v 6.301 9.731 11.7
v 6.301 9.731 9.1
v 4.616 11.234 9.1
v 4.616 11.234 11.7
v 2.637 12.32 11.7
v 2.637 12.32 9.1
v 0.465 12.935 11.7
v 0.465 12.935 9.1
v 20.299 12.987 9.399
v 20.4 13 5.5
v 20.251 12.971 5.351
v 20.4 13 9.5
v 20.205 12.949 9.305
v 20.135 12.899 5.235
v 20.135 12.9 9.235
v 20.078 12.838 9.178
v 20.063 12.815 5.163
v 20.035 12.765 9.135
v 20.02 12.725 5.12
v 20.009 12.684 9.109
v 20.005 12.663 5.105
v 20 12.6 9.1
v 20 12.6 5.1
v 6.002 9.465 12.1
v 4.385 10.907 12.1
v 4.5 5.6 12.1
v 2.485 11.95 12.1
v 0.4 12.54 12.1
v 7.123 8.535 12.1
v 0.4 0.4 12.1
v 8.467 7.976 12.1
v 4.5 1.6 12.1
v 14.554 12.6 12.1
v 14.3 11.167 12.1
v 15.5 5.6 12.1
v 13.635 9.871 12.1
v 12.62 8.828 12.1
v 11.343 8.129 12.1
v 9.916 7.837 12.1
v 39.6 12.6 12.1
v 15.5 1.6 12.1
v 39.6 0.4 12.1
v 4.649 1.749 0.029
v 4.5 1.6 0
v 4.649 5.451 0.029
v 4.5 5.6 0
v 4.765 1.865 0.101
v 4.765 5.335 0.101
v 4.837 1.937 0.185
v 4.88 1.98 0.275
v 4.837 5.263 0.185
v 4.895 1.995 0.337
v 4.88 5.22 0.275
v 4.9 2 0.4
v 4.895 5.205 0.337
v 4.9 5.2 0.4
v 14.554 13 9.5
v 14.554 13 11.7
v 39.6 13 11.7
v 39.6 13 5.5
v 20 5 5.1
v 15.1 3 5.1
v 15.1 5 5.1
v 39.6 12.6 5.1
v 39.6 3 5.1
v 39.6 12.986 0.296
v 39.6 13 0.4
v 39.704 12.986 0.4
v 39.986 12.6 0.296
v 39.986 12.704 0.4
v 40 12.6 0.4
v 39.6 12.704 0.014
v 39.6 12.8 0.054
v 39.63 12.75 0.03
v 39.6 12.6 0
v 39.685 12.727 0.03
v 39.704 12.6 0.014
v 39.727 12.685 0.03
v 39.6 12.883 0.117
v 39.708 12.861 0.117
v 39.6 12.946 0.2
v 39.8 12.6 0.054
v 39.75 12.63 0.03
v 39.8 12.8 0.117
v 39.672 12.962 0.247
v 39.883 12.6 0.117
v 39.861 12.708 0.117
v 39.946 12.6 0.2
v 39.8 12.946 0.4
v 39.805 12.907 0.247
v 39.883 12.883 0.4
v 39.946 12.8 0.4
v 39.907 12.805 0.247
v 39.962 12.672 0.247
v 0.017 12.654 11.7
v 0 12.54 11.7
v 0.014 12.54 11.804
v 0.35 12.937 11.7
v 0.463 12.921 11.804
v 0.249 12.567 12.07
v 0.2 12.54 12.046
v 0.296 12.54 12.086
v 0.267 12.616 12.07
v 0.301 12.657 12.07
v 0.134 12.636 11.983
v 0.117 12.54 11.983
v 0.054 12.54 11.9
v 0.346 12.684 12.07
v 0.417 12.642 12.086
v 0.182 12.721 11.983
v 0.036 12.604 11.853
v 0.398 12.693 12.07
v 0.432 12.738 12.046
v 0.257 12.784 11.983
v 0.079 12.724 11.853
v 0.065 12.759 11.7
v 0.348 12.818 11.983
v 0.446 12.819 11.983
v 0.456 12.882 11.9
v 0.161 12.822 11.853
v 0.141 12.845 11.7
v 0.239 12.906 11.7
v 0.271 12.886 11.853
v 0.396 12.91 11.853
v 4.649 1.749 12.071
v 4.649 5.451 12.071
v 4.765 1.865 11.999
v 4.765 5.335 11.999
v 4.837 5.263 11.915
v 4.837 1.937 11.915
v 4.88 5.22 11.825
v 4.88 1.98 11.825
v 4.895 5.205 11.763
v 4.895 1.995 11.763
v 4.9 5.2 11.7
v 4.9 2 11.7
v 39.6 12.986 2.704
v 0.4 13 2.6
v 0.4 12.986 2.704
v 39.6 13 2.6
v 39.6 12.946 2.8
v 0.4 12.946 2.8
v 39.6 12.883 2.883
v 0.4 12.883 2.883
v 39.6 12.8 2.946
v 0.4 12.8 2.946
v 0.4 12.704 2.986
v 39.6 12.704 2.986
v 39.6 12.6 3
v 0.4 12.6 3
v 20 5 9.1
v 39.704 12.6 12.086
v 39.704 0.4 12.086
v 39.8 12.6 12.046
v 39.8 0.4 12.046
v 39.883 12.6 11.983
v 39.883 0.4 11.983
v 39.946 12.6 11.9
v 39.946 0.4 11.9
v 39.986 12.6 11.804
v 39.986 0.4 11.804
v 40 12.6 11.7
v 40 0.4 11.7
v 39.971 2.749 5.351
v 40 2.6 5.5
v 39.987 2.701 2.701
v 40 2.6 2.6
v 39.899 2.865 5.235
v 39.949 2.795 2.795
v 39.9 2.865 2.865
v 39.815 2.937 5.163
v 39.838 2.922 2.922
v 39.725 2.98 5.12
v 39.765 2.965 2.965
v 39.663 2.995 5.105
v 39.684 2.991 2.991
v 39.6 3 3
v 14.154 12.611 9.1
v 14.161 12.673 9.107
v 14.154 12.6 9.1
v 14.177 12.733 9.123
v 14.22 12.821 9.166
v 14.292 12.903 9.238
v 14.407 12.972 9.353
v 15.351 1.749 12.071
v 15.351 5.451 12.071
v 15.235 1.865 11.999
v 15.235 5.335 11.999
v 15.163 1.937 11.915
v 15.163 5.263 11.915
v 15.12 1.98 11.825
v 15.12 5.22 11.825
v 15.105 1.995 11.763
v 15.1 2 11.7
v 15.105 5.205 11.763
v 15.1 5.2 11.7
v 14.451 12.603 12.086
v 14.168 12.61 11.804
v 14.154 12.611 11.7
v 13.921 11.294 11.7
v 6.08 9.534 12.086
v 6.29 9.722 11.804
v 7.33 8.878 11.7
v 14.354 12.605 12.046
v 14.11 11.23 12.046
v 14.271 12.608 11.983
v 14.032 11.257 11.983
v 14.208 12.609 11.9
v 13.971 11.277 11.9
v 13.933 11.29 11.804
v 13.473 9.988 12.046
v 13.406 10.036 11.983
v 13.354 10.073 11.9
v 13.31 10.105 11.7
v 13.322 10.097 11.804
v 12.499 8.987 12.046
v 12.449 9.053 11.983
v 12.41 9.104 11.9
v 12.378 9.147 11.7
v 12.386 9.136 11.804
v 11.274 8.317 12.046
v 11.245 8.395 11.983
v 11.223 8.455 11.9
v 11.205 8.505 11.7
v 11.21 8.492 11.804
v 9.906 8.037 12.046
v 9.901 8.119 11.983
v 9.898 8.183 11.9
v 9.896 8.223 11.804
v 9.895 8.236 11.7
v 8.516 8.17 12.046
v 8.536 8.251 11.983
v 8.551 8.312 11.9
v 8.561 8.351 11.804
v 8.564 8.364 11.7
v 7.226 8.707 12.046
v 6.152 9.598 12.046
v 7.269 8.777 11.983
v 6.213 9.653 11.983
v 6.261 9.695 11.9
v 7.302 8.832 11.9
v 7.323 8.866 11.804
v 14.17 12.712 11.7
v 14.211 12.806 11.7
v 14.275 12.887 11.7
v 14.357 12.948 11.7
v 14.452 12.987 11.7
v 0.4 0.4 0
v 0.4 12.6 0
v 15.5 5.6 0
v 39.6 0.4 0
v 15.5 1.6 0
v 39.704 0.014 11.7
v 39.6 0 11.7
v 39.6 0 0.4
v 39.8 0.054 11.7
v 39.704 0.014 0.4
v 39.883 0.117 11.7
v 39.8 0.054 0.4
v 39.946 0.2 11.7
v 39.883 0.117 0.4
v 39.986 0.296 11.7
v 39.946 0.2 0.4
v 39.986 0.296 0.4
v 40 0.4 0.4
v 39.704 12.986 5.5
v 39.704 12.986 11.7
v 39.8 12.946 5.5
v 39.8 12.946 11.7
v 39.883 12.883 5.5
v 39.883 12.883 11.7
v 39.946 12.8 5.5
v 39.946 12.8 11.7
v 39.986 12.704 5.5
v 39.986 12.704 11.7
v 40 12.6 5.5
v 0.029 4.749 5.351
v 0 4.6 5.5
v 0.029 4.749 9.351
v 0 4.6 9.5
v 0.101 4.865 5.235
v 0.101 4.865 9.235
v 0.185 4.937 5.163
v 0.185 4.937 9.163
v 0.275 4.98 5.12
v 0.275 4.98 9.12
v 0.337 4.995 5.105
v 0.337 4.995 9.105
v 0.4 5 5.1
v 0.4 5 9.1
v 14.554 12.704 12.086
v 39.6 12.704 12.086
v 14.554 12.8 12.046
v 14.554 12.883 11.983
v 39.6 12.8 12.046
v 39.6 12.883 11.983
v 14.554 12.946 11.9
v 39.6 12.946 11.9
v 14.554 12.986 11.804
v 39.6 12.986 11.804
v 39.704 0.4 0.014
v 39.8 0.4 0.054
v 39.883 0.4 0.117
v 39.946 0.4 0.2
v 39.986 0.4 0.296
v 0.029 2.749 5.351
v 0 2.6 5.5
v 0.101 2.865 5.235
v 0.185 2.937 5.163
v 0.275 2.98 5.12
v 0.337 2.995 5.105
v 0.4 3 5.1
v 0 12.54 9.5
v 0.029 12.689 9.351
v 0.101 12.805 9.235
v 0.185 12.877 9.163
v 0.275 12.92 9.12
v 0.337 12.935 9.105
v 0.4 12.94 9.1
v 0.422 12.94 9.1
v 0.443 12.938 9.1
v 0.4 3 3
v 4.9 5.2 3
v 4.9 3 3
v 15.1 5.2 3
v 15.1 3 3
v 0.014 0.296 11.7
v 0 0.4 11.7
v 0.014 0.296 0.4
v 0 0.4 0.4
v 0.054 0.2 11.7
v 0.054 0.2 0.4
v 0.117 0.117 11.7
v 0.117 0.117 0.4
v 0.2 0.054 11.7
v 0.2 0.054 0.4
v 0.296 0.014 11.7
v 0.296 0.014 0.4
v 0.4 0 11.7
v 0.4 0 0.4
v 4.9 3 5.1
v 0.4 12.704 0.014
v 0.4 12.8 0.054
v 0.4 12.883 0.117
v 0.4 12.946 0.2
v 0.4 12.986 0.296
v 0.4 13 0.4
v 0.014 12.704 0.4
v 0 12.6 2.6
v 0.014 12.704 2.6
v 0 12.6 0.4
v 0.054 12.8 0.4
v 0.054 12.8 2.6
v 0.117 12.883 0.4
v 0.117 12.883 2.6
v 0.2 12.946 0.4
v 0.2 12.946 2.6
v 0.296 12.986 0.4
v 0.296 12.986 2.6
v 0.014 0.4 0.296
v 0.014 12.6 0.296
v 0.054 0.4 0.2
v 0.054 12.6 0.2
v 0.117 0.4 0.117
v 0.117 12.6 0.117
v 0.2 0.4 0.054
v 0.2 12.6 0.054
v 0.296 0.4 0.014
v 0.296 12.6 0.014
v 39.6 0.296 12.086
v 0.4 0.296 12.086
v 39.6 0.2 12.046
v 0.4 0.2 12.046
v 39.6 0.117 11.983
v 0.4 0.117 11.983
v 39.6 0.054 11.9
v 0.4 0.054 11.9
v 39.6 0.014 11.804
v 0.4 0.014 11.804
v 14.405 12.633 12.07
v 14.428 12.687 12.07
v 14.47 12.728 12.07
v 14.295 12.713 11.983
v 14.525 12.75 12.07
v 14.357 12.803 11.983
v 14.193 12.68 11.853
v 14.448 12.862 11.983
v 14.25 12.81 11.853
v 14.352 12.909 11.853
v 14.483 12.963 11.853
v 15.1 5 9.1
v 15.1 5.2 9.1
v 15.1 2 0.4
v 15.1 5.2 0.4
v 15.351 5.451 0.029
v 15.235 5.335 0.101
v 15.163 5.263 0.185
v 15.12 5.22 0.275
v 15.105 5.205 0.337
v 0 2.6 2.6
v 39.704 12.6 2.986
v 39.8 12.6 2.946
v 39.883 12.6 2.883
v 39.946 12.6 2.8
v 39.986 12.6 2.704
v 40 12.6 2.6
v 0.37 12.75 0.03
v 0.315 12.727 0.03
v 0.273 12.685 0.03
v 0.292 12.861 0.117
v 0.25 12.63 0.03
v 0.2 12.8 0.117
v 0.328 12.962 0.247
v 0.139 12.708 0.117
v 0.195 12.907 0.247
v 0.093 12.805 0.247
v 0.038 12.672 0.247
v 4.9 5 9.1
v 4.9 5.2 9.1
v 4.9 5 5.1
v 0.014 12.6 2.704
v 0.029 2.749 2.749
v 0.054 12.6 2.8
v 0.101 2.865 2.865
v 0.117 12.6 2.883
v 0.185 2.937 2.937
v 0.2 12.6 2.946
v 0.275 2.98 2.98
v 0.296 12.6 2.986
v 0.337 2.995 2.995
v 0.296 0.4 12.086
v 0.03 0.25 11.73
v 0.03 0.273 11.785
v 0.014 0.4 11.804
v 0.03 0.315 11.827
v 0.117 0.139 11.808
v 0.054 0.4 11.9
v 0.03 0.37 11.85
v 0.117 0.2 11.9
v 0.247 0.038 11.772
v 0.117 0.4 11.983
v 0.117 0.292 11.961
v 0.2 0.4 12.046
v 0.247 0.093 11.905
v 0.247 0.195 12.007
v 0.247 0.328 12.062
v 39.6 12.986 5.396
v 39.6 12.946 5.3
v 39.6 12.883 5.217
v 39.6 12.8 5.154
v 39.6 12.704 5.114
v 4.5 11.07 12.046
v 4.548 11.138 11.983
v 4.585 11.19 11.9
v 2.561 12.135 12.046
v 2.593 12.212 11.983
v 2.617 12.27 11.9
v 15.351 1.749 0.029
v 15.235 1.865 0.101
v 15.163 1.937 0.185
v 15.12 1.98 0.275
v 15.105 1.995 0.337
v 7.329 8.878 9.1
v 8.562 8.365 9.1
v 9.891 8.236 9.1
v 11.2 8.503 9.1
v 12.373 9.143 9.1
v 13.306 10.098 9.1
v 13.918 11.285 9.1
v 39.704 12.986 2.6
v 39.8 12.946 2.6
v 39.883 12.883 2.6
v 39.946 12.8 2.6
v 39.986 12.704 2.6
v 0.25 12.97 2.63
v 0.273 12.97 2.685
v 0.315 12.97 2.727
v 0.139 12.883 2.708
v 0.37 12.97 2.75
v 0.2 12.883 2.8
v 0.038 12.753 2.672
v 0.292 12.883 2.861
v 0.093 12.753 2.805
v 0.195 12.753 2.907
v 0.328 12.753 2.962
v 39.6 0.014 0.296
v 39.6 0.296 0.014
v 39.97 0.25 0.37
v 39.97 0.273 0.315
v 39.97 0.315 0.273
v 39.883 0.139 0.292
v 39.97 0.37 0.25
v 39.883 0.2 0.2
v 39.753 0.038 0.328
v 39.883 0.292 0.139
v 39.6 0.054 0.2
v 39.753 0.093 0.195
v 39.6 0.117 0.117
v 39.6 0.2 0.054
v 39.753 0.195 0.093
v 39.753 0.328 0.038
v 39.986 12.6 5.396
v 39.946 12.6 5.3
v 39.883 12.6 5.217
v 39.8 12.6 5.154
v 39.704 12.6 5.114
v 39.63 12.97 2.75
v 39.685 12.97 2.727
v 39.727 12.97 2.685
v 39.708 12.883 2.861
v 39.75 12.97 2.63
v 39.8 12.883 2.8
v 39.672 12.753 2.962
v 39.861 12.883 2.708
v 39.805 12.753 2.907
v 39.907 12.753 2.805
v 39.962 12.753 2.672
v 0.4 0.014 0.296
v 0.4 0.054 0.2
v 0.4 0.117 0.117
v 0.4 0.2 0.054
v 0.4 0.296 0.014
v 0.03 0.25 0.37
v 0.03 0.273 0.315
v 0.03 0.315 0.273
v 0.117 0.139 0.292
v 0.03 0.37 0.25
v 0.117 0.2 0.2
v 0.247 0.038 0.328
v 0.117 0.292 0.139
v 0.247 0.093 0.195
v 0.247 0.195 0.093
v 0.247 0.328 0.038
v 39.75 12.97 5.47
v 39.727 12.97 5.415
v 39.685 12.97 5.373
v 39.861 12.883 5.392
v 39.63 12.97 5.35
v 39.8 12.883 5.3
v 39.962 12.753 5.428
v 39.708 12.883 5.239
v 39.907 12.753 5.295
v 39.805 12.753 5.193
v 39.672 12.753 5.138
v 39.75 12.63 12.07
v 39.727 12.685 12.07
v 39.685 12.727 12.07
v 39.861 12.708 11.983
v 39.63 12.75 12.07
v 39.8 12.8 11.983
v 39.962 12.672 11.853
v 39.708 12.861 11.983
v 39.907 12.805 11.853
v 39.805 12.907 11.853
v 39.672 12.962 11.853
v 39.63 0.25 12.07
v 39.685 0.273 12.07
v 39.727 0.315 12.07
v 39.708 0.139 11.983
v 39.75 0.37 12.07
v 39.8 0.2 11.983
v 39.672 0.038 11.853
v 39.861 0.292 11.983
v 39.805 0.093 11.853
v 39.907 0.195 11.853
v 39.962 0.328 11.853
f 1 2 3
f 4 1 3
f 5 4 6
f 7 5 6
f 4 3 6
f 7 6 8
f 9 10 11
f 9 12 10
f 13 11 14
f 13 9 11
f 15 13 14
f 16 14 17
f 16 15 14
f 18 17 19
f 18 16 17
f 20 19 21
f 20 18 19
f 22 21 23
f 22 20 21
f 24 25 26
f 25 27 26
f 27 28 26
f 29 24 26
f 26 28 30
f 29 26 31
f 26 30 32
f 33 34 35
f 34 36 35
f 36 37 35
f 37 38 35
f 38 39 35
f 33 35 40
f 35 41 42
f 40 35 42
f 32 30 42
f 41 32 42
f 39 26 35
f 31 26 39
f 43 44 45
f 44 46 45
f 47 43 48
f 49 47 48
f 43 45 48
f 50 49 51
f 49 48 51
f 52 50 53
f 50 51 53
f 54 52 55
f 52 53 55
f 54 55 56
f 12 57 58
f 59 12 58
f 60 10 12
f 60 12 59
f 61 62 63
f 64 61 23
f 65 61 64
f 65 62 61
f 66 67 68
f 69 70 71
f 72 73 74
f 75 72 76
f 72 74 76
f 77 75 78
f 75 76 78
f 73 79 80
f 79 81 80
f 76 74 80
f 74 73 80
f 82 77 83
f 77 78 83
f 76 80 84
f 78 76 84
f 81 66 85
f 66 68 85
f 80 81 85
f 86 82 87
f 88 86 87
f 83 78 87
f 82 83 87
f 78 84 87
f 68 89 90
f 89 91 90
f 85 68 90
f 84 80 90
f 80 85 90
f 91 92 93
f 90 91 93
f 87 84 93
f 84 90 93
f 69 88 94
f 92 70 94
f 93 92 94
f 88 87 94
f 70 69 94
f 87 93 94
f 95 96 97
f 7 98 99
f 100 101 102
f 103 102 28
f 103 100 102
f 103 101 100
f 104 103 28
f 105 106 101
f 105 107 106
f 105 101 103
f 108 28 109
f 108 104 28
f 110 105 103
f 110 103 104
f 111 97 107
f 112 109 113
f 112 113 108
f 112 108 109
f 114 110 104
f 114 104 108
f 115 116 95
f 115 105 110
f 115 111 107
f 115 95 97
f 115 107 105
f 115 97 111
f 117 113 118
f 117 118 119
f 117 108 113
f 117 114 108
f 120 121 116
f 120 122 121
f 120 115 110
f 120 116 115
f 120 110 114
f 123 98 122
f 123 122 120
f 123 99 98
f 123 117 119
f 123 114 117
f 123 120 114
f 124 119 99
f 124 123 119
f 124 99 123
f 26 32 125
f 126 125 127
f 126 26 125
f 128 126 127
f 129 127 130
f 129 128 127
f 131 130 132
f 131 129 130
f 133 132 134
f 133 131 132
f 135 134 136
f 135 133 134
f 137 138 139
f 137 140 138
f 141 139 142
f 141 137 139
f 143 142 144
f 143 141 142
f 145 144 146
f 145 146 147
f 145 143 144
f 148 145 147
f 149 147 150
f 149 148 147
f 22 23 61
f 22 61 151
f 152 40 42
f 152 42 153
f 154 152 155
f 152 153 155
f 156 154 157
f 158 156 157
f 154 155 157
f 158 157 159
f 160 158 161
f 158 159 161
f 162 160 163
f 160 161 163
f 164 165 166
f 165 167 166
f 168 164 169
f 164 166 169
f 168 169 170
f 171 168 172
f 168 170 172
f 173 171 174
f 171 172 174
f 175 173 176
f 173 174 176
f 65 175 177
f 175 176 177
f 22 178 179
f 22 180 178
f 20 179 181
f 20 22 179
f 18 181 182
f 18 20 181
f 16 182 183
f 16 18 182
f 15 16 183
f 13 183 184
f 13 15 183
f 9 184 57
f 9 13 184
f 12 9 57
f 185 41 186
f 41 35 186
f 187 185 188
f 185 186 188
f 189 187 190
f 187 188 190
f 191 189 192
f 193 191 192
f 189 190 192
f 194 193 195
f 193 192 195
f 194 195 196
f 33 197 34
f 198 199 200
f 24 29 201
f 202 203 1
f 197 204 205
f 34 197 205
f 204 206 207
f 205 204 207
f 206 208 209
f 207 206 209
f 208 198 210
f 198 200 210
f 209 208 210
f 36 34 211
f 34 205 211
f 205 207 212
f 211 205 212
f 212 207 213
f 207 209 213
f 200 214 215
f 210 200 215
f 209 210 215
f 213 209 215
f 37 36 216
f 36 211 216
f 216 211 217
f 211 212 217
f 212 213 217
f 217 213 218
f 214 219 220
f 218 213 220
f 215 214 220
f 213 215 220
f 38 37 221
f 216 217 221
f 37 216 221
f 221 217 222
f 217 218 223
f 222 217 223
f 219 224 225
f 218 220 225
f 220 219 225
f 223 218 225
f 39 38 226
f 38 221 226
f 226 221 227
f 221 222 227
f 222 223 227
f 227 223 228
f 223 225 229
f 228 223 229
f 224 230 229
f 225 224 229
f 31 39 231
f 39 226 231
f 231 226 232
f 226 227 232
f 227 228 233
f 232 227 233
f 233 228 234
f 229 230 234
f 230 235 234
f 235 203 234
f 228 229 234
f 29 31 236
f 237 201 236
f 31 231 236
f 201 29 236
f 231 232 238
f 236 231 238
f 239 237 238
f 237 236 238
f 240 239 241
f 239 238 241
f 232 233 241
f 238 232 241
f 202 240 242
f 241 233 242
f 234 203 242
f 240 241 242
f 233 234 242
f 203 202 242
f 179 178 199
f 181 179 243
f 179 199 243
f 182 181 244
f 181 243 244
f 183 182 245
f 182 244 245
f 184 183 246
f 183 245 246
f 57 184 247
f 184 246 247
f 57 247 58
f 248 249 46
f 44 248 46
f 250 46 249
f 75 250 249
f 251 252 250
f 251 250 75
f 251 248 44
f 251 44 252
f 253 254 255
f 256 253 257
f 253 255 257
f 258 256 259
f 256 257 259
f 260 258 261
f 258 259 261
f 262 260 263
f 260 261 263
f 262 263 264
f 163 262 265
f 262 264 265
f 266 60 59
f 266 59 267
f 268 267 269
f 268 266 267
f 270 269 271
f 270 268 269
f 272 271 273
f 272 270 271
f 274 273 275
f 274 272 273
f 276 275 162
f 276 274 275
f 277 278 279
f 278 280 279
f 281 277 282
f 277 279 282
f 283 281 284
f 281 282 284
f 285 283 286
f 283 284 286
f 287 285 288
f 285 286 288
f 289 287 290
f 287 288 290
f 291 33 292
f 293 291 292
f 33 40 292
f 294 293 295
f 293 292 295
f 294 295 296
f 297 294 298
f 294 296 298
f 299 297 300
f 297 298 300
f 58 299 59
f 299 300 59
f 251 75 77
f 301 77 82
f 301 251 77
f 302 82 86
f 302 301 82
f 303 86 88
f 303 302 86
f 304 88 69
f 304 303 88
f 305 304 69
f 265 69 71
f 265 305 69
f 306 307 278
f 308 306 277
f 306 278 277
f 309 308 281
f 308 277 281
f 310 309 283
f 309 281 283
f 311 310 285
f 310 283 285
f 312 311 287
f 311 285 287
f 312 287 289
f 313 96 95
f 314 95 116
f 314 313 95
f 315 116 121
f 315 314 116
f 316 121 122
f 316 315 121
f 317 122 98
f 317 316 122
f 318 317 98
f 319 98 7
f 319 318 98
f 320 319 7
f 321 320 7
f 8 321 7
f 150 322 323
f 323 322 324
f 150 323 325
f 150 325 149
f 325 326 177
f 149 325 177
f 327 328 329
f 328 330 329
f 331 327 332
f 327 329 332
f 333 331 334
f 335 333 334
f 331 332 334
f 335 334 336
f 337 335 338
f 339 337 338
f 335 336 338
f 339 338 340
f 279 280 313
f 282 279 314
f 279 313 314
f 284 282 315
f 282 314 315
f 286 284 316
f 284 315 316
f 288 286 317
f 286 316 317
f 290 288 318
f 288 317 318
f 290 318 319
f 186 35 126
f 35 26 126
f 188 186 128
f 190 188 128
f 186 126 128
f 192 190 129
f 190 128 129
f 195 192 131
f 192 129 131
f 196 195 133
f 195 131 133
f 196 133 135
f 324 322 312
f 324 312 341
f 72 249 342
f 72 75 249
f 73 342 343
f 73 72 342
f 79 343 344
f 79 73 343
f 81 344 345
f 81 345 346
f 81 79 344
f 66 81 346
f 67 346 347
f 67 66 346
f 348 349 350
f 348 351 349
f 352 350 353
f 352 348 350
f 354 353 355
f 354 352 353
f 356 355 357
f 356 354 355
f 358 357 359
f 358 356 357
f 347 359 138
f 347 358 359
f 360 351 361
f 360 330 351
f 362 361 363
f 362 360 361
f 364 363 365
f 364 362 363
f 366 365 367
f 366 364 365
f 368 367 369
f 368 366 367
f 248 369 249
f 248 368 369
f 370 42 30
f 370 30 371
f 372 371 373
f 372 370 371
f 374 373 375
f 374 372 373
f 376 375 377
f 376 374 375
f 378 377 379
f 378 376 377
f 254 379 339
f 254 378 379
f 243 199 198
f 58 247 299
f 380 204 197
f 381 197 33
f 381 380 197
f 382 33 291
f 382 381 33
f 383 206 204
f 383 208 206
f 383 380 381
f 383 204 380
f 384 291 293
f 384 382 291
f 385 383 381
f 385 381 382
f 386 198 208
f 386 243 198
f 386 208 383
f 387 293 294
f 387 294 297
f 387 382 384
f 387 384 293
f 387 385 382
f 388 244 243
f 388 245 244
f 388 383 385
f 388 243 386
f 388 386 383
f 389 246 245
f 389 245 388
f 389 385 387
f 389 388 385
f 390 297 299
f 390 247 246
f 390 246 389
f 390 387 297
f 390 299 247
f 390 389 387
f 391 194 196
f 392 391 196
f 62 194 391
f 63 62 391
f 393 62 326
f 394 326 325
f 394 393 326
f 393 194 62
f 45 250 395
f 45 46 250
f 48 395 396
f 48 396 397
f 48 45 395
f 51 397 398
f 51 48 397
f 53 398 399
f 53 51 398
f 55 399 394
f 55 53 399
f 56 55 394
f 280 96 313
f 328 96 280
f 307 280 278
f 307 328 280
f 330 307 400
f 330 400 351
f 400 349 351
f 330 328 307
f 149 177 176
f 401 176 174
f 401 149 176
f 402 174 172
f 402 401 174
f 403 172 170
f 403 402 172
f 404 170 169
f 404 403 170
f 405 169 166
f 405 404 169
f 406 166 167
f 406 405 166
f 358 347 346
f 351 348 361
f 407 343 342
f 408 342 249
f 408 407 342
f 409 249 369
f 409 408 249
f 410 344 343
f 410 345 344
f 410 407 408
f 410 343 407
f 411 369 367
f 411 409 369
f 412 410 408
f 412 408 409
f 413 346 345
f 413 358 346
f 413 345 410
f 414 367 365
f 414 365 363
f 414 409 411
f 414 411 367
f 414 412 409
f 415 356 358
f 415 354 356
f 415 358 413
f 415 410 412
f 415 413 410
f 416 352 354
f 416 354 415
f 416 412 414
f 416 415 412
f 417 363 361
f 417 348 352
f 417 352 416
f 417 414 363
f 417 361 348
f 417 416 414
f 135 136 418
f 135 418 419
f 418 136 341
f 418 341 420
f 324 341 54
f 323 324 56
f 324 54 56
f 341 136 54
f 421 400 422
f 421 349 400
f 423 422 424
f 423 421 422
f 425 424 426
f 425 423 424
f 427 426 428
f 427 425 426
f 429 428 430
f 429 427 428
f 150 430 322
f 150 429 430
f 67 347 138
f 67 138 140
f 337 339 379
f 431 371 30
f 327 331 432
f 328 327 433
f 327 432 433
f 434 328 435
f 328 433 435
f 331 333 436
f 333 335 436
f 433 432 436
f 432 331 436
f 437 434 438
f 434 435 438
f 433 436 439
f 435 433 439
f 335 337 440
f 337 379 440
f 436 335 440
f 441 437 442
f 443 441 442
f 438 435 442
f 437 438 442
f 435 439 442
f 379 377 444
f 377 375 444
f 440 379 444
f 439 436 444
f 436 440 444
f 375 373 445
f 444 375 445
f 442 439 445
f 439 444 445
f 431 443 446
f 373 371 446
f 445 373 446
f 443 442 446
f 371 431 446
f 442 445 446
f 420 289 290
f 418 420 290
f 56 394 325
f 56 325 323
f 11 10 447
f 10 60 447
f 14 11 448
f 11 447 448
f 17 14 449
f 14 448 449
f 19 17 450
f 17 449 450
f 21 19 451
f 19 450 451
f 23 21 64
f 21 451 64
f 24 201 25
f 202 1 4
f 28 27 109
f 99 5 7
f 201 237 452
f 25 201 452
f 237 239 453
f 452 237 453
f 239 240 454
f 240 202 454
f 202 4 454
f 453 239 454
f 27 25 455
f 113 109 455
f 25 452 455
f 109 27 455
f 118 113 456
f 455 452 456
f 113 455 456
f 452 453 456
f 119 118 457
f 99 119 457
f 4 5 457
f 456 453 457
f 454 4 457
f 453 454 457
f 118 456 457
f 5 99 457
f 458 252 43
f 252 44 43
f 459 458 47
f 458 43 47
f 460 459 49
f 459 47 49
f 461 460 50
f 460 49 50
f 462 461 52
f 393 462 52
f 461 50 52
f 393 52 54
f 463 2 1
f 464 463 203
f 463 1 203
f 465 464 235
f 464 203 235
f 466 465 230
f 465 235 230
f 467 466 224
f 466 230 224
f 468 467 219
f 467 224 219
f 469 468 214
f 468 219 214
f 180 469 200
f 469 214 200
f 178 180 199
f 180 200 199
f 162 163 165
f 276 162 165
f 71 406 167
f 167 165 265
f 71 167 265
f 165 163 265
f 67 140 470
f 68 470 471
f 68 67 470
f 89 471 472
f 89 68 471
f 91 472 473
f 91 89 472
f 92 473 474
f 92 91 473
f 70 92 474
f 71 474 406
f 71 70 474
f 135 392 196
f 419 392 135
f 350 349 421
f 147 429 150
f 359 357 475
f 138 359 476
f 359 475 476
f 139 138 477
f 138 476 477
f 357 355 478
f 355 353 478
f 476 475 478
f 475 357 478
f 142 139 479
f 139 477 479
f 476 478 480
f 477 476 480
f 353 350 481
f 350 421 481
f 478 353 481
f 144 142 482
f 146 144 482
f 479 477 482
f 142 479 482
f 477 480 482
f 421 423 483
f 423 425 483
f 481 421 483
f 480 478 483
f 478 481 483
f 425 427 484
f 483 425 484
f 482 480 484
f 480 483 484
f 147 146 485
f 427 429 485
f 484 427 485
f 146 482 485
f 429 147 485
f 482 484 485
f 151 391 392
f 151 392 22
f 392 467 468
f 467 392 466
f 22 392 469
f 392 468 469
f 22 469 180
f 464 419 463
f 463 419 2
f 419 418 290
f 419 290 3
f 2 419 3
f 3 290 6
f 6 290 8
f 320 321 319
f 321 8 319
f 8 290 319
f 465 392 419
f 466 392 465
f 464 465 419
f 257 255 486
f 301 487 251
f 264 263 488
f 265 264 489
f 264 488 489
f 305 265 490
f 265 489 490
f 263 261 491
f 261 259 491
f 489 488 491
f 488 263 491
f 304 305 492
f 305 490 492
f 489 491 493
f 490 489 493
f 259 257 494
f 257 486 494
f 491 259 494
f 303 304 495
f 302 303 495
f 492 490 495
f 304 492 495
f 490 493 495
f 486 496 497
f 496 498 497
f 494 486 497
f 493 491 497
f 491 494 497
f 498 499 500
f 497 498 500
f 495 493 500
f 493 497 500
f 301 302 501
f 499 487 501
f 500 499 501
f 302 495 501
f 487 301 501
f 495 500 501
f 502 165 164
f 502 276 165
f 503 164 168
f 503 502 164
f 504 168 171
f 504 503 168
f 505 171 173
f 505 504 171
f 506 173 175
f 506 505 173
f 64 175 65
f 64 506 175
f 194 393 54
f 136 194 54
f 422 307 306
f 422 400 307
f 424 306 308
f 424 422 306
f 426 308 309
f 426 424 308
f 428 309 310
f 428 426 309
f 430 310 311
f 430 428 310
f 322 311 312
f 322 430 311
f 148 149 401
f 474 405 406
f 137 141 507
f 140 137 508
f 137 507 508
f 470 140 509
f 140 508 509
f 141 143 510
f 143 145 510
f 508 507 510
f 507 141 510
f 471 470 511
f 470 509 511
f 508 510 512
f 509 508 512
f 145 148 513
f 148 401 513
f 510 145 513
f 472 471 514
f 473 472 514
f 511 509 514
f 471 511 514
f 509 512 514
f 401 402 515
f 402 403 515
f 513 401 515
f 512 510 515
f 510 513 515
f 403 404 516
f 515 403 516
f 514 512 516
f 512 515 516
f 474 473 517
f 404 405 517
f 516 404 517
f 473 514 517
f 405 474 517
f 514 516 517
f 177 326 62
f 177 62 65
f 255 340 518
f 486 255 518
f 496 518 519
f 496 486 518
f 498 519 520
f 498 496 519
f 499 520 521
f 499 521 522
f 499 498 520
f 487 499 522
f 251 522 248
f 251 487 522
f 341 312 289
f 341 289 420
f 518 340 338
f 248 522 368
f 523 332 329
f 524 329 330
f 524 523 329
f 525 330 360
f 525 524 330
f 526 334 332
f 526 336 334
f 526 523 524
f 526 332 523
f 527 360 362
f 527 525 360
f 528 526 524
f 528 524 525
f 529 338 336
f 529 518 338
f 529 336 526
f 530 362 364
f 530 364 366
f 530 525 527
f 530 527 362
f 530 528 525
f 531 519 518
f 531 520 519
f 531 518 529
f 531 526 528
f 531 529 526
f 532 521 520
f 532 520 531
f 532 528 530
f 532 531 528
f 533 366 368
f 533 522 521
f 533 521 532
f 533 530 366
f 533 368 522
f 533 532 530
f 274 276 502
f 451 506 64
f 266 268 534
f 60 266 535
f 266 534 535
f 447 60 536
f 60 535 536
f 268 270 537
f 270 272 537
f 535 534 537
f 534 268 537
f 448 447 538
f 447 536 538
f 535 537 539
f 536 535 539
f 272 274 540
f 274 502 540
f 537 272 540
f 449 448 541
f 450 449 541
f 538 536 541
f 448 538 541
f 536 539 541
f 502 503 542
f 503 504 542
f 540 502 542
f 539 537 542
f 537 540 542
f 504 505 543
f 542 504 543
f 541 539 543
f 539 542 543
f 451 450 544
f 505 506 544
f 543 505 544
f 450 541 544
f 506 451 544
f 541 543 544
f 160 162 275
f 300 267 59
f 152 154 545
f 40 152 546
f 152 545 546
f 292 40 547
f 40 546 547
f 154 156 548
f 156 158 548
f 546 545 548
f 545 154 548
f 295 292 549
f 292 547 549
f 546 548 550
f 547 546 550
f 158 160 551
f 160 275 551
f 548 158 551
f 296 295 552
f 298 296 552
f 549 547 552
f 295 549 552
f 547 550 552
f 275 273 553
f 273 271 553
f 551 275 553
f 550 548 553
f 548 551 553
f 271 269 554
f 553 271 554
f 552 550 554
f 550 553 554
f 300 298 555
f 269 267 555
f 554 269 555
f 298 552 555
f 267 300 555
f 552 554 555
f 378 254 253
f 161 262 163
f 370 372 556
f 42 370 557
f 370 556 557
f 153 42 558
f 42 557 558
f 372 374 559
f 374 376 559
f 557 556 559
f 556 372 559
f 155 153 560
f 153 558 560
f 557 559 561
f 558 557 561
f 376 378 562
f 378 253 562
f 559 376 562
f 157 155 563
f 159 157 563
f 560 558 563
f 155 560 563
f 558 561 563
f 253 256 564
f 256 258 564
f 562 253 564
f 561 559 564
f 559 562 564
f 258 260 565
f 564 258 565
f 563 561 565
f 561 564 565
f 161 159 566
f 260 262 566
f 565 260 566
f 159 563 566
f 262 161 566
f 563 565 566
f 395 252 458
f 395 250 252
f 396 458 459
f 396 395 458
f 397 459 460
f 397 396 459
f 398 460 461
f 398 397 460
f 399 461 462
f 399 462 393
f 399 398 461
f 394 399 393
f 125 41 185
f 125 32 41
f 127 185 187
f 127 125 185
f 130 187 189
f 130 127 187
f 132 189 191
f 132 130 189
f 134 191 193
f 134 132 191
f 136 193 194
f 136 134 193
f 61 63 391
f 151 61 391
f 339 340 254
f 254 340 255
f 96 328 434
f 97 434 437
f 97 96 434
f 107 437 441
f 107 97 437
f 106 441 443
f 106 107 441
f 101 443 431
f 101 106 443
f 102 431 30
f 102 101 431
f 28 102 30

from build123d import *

# Parameters (mm, degrees)
SKETCH1_W           = 40
SKETCH1_H           = 12.1
BOSS_EXTRUDE1_DEPTH = 3
SKETCH2_W           = 40
SKETCH2_H           = 3
SKETCH2_H_2         = 7
BOSS_EXTRUDE2_DEPTH = 10
SKETCH3_W           = 10.2
SKETCH3_H           = 3.2
CUT_EXTRUDE1_DEPTH  = 44.765397291
SKETCH4_W           = 4
SKETCH4_H           = 8
CUT_EXTRUDE2_DEPTH  = 20
SKETCH5_R           = 4.5
CUT_EXTRUDE3_DEPTH  = 3
FILLET2_R           = 10
FILLET1_R           = 0.4


with BuildPart() as part:
    # Sketch1 → Boss-Extrude1 (new body)
    with BuildSketch(Plane(origin=(0, 0, 0), x_dir=(1, 0, 0), z_dir=(0, 1, 0))):
        with Locations((20, -6.05)):
            Rectangle(SKETCH1_W, SKETCH1_H)
    extrude(amount=BOSS_EXTRUDE1_DEPTH)

    # Sketch2 → Boss-Extrude2 (add)
    with BuildSketch(Plane(origin=(0, 3, 0), x_dir=(1, 0, 0), z_dir=(0, 1, 0))):
        with Locations((20, -1.5)):
            Rectangle(SKETCH2_W, SKETCH2_H)
        with Locations((20, -8.6)):
            Rectangle(SKETCH2_W, SKETCH2_H_2)
    extrude(amount=BOSS_EXTRUDE2_DEPTH)

    # Sketch3 → Cut-Extrude1 (cut, through all)
    with BuildSketch(Plane(origin=(0, 0, 0), x_dir=(-1, 0, 0), z_dir=(0, 0, -1))):
        with Locations((-10, 3.6)):
            Rectangle(SKETCH3_W, SKETCH3_H)
    extrude(amount=-CUT_EXTRUDE1_DEPTH, mode=Mode.SUBTRACT)

    # Sketch4 → Cut-Extrude2 (cut)
    with BuildSketch(Plane.ZY):
        with Locations((7.1, 9)):
            Rectangle(SKETCH4_W, SKETCH4_H)
    extrude(amount=-CUT_EXTRUDE2_DEPTH, mode=Mode.SUBTRACT)

    # Sketch5 → Cut-Extrude3 (cut)
    with BuildSketch(Plane.XY.offset(12.1)):
        with Locations((9.655746404, 12.73)):
            Circle(SKETCH5_R)
    extrude(amount=-CUT_EXTRUDE3_DEPTH, mode=Mode.SUBTRACT)

    # Fillet2
    # the kernel refuses this fillet: 10 mm, written as the material it takes off along each edge
    with BuildSketch(Plane(origin=(5.163853707, 13, 9.1), x_dir=(0.32846589208199206, -0.9445158324447405, 0), z_dir=(0, 0, 1))) as fillet2_piece_1:
        with BuildLine():
            CenterArc((7.306356337, -9.231062175), FILLET2_R, 112.615500581, 41.575528471)
            Line((-1.696149814, -4.877341583), (0, 0))
            ThreePointArc((0, 0), (1.730452817, -0.346022021), (3.460905633, 0))
        make_face()
    extrude(amount=15.909634267, mode=Mode.SUBTRACT)

    # Fillet1
    fillet1_edges = [part.edges().sort_by_distance(p)[0] for p in [
        (0, 3, 4.05),
        (0, 8, 3),
        (40, 8, 3),
        (0, 13, 1.5),
        (20, 13, 3),
        (40, 13, 1.5),
        (20, 13, 0),
        (40, 3, 4.05),
        (40, 8, 5.1),
        (40, 13, 8.6),
        (30, 13, 5.1),
        (15.1, 3.6, 12.1),
        (10, 5.2, 12.1),
        (4.9, 3.6, 12.1),
        (10, 2, 12.1),
        (15.1, 3.6, 0),
        (10, 2, 0),
        (4.9, 3.6, 0),
        (20, 0, 0),
        (10, 5.2, 0),
        (40, 0, 6.05),
        (20, 0, 12.1),
        (0, 0, 6.05),
        (0, 13, 10.6),
        (0, 4, 5.1),
        (17.07381955, 13, 9.1),
        (20, 13, 7.1),
        (0, 5, 7.1),
        (0, 9, 9.1),
        (0, 6.5, 0),
        (40, 6.5, 0),
        (40, 6.5, 12.1),
        (0, 6.5, 12.1),
        (27.07381955, 13, 12.1),
        (14.147639101, 13, 10.6),
        (11.38619922, 8.576022021, 12.1),
        (3.450117075, 11.943404417, 12.1),
    ]]
    fillet(fillet1_edges, radius=FILLET1_R)


solid = part.part
